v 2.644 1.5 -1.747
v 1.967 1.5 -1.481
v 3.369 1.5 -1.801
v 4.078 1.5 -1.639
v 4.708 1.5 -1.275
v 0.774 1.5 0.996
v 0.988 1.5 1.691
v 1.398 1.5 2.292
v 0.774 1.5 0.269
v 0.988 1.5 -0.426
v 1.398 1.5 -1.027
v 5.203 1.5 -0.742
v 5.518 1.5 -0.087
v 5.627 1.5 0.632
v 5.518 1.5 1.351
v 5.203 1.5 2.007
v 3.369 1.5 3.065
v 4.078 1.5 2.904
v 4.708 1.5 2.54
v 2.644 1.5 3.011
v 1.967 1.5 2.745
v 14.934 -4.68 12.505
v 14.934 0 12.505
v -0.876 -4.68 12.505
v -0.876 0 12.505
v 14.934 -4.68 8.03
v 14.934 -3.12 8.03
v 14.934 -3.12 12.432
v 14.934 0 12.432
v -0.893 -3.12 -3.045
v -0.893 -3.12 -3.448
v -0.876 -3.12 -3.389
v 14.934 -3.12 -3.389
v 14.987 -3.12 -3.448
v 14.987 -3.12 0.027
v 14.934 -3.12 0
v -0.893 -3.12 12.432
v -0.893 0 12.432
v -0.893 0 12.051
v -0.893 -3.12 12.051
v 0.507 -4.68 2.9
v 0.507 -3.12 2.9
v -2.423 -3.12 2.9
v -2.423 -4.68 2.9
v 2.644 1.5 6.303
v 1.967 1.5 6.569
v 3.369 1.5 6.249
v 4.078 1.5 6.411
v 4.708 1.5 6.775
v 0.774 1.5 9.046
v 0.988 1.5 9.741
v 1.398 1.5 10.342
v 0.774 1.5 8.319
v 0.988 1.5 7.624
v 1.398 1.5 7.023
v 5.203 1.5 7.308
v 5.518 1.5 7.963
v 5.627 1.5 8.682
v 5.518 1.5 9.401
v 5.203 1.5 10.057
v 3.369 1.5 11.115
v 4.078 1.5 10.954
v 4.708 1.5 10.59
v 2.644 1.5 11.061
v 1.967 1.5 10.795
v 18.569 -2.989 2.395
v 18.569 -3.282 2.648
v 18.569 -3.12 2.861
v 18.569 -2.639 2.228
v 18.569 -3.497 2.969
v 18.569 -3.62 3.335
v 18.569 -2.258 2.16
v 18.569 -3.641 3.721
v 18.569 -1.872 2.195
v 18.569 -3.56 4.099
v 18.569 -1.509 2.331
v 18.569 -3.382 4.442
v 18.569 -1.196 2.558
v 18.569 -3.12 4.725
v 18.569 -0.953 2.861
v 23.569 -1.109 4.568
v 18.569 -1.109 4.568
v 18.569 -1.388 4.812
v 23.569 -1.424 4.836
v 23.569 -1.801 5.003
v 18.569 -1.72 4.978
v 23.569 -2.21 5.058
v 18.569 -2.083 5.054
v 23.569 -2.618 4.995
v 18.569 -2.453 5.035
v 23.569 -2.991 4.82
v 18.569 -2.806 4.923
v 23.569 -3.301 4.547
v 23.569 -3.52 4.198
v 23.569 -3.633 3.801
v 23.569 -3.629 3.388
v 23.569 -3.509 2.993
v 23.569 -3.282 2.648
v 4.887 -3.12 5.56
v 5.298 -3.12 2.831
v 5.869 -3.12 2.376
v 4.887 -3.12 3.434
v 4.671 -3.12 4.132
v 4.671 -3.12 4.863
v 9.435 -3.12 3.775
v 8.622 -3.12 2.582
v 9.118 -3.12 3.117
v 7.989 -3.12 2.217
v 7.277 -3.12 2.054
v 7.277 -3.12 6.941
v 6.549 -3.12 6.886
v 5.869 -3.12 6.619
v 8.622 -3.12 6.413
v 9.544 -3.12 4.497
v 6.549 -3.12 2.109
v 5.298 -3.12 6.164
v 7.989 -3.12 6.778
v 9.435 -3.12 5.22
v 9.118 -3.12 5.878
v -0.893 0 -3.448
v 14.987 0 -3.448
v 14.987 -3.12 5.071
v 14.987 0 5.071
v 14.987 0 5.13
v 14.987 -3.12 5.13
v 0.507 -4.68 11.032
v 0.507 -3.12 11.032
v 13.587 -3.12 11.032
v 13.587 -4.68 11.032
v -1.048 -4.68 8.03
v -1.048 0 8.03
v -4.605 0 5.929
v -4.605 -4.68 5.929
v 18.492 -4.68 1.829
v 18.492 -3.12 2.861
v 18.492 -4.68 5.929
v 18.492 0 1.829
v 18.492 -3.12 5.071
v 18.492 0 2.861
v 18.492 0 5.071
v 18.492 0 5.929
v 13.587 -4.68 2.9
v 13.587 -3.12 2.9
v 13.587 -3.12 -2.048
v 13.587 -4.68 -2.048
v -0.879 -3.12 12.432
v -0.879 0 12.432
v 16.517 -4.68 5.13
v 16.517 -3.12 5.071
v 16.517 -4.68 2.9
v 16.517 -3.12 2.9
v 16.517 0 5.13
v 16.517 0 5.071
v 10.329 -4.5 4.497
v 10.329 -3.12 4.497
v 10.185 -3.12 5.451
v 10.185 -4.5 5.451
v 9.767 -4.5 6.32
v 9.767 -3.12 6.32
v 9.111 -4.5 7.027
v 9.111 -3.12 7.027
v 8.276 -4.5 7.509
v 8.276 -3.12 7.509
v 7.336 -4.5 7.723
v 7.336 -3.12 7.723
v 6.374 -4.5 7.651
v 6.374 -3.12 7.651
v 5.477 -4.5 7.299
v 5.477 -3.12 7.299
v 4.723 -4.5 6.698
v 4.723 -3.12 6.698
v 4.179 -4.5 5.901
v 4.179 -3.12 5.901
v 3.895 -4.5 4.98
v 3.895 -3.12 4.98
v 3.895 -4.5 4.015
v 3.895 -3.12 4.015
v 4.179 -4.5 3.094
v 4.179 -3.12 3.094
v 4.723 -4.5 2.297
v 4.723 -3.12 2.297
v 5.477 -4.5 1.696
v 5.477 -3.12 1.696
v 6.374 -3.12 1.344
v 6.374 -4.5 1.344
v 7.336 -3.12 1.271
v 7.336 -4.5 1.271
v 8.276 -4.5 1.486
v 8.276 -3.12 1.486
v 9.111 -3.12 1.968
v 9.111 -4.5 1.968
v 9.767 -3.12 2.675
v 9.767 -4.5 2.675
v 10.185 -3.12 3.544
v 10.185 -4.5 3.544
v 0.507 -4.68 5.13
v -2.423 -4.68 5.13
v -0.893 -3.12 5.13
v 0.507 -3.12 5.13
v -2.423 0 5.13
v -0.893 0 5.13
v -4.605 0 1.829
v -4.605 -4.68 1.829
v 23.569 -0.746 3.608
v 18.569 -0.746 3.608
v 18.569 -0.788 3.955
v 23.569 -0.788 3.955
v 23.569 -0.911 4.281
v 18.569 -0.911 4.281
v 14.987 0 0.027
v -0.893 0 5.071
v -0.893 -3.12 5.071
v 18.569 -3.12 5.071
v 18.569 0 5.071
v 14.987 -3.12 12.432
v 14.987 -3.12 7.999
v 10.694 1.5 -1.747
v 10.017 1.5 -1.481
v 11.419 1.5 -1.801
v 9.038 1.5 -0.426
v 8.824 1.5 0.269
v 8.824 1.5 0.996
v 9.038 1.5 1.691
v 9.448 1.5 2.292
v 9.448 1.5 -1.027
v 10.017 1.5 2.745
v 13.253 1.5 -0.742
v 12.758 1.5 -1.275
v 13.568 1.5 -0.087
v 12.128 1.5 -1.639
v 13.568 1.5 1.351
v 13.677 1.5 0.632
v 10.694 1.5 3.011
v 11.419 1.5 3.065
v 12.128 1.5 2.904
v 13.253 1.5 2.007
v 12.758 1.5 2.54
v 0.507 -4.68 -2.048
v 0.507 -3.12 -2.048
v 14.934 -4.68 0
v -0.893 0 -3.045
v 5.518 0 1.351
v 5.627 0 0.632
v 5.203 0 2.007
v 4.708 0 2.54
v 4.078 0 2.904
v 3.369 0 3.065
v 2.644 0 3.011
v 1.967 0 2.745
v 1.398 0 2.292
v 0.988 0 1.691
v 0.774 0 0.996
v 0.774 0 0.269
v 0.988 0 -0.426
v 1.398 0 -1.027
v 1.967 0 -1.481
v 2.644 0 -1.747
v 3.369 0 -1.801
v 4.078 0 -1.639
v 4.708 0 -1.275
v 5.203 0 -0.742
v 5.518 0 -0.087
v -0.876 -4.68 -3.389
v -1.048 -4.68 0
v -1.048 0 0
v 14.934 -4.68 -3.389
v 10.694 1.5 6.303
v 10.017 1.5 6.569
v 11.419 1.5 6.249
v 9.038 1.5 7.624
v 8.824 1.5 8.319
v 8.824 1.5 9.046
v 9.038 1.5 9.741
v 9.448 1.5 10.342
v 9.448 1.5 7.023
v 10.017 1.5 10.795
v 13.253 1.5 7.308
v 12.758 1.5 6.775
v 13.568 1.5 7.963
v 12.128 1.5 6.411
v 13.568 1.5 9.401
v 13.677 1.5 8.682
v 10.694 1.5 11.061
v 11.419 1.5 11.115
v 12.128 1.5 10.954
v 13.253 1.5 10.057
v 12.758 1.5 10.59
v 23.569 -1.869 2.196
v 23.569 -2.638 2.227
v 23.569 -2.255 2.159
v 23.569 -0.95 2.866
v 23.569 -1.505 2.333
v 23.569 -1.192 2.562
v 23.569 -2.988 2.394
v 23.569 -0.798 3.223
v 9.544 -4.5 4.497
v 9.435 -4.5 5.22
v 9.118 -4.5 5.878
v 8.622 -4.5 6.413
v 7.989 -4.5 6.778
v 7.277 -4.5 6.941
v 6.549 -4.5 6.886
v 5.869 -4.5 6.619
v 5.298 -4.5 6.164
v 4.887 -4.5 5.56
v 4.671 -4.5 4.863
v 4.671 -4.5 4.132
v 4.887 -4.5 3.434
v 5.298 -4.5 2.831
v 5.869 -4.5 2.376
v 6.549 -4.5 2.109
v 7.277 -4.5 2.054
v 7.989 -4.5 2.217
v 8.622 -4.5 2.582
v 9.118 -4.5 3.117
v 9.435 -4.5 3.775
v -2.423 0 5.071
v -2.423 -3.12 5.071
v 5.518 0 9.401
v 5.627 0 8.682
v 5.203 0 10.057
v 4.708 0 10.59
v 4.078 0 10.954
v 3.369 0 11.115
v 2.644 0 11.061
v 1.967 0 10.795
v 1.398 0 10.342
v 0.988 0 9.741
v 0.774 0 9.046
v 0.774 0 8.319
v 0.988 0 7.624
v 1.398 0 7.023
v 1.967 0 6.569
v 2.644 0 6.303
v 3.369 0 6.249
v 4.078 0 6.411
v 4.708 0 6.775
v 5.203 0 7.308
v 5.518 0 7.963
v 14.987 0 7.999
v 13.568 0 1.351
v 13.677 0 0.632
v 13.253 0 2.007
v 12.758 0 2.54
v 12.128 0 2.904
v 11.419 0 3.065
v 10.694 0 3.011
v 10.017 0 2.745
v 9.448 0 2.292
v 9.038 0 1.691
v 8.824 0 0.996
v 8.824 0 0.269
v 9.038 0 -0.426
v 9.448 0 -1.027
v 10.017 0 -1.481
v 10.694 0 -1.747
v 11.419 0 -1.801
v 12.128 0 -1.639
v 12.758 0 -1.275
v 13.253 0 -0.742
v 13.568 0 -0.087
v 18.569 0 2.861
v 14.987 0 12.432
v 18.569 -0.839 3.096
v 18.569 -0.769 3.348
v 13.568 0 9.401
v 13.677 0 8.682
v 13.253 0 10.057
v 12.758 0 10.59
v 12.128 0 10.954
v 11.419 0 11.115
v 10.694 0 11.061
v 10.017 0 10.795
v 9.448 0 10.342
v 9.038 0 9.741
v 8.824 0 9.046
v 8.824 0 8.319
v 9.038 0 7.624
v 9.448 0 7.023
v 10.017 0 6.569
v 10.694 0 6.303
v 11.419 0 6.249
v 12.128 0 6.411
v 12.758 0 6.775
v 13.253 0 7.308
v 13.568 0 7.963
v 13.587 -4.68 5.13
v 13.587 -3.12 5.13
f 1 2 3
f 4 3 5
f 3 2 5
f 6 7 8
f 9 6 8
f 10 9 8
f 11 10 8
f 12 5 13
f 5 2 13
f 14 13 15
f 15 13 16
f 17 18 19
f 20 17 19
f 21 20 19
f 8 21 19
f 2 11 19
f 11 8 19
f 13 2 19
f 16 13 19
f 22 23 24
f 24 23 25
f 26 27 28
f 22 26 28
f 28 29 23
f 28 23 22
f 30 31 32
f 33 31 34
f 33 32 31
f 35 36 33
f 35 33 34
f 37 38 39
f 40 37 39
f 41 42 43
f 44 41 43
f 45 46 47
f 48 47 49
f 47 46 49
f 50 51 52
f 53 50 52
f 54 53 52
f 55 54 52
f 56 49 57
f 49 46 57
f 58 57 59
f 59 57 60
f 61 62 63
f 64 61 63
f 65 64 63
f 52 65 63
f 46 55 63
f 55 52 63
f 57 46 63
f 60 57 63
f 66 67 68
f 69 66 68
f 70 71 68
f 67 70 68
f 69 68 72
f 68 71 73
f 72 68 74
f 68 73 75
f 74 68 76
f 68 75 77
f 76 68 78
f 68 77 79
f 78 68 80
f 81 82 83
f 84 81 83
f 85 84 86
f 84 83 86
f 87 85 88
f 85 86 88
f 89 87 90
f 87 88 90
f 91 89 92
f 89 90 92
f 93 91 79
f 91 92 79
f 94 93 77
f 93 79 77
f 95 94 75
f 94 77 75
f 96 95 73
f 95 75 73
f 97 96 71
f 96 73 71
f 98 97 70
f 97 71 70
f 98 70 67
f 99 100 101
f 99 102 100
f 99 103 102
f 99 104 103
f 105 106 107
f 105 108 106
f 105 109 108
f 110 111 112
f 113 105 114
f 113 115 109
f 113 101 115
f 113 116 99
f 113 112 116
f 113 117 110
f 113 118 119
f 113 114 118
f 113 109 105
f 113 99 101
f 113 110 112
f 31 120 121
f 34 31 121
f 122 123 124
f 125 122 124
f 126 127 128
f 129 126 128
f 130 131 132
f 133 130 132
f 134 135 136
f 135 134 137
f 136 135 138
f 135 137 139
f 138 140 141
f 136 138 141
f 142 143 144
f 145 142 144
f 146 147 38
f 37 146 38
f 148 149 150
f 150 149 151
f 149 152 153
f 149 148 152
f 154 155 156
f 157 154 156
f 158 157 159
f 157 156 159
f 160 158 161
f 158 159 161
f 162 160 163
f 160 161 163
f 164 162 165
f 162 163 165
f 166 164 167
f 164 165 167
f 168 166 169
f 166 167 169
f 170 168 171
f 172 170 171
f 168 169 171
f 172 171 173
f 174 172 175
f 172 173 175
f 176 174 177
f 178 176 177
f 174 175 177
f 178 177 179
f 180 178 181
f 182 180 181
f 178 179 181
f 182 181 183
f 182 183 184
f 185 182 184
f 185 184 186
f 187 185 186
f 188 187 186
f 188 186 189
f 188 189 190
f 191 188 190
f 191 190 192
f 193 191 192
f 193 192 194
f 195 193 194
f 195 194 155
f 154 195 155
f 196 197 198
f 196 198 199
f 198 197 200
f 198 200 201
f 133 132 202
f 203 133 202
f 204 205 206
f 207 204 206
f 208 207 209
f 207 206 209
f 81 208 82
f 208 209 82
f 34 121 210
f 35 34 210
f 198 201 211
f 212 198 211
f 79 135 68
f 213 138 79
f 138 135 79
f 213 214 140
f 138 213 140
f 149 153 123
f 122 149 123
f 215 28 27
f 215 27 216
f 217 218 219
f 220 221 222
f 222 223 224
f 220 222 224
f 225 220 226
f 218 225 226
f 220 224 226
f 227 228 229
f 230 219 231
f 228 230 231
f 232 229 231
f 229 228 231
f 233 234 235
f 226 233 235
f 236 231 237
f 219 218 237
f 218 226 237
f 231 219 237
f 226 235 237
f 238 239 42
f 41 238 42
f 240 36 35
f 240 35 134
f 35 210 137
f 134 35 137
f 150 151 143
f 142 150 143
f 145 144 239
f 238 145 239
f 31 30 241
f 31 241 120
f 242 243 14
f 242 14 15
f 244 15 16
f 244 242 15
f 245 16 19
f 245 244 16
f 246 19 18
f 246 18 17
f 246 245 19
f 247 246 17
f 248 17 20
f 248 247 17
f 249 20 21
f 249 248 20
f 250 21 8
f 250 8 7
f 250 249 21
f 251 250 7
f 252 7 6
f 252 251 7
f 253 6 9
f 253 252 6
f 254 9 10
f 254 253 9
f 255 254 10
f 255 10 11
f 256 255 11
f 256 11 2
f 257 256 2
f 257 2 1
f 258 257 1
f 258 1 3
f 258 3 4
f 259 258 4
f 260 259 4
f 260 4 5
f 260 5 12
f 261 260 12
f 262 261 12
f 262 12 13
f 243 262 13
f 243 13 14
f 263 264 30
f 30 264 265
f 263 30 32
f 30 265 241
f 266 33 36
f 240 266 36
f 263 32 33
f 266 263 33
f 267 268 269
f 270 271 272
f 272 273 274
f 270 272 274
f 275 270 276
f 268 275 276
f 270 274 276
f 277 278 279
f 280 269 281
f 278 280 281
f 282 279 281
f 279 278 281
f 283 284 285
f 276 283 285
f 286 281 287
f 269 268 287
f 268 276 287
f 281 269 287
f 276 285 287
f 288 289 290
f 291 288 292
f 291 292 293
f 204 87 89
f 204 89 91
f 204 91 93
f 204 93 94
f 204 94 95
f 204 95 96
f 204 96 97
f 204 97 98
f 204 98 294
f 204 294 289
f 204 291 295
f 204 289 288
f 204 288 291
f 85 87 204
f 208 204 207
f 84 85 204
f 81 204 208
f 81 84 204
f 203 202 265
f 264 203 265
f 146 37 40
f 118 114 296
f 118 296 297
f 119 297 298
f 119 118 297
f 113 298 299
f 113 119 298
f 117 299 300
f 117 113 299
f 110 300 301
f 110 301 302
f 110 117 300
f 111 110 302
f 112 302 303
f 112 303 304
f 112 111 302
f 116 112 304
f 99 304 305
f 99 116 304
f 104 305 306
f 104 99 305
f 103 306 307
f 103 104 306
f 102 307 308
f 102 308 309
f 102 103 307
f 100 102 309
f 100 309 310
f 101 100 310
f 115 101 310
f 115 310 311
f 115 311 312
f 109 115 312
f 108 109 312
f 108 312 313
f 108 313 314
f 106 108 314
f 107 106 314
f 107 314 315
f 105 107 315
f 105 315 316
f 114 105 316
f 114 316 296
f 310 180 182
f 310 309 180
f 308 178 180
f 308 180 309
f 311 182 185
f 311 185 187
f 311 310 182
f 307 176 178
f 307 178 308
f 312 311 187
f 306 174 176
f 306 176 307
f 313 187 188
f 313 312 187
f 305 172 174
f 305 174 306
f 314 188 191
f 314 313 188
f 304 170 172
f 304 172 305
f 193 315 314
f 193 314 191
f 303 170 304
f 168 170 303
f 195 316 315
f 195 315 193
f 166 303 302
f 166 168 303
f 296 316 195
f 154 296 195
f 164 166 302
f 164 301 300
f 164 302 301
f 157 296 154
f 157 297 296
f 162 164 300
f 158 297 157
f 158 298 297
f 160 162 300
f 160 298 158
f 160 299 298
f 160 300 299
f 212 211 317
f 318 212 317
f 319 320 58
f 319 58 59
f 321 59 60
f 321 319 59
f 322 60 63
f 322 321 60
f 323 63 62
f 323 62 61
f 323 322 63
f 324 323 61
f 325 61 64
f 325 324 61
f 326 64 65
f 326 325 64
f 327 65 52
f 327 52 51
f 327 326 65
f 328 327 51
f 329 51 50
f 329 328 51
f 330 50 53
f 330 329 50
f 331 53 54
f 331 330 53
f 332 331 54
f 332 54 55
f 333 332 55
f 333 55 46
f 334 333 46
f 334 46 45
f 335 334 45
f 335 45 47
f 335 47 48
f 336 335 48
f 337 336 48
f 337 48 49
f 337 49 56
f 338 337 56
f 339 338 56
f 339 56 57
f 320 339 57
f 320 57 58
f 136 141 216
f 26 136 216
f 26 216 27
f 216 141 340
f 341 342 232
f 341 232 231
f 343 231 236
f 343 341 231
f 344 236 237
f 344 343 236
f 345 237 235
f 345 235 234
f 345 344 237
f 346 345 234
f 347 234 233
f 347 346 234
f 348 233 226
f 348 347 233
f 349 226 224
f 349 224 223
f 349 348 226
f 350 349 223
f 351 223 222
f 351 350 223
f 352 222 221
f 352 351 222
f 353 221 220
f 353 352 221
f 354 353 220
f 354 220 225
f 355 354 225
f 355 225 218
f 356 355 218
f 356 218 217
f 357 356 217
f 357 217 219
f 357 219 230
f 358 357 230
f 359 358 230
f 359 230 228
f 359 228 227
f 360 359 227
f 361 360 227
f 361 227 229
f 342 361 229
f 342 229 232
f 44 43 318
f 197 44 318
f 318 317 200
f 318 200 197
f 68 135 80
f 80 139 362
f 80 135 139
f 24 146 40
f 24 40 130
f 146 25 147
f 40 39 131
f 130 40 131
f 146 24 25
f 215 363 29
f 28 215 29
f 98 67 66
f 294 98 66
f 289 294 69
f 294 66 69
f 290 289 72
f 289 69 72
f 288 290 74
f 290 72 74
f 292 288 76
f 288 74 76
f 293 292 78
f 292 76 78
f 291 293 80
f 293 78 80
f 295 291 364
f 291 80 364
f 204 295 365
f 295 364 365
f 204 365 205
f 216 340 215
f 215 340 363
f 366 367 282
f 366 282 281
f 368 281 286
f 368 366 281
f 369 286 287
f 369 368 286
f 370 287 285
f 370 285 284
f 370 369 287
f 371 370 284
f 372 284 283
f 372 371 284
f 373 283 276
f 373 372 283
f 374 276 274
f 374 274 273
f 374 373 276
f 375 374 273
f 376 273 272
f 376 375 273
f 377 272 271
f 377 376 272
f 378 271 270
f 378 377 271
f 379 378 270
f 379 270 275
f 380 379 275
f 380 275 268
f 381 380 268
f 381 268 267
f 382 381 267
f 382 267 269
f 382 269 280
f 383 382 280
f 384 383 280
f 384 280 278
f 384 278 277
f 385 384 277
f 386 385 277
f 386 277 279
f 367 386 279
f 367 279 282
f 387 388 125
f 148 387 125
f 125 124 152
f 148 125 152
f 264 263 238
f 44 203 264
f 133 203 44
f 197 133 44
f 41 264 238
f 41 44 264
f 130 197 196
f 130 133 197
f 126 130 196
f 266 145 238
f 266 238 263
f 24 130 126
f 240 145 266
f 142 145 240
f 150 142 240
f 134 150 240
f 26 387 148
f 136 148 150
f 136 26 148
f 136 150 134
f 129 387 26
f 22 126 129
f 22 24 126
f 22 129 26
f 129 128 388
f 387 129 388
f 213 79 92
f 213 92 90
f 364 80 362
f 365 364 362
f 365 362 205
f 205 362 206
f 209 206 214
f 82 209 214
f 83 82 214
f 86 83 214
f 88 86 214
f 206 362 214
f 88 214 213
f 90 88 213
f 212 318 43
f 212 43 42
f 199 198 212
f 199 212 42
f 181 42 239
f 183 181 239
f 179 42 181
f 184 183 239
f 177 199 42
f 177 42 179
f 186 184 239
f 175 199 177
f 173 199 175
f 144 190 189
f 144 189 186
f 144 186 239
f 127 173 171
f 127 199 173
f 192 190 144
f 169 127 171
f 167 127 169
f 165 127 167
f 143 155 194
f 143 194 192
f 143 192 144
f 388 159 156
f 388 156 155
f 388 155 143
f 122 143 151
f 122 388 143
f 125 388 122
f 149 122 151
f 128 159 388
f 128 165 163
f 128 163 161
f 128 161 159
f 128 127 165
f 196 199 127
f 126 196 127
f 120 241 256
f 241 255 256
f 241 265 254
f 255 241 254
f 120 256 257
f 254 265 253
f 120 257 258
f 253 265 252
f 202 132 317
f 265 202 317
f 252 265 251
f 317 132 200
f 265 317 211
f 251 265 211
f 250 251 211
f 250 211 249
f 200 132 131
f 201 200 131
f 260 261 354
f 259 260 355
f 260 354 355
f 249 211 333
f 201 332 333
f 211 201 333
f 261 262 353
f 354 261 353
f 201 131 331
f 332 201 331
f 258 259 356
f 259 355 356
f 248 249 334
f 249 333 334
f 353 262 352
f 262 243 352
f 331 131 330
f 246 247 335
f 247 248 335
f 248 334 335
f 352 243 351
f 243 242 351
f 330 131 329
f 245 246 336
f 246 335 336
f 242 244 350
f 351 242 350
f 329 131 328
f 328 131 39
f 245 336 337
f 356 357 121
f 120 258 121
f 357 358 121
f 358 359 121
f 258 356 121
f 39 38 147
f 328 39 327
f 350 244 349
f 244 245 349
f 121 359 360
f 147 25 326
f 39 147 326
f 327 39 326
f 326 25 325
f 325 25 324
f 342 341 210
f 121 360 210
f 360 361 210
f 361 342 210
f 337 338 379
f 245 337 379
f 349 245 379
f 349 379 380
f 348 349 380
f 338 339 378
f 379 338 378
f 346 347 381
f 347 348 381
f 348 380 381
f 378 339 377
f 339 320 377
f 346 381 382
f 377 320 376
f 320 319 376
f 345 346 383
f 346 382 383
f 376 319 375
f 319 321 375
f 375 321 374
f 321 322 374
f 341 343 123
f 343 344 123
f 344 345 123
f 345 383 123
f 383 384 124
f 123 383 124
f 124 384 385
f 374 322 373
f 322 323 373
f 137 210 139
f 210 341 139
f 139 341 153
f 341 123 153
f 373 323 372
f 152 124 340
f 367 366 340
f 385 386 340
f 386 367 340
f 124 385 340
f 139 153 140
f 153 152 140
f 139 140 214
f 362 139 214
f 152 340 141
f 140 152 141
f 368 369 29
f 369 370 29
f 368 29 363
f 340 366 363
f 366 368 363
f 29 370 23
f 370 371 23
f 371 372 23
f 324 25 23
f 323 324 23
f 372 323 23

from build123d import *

# Parameters (mm, degrees)
F1_DEPTH = 3.12
F2_R     = 2.44
F3_DEPTH = 1.5
F5_DEPTH = 4.68
F6_R     = 3.235
F6_R_2   = 2.45
F7_DEPTH = 4.5
F9_DEPTH = 5


# Not quite as in the source:
# - the program builds the solid bodies; features that only make, move or delete a surface that nothing else refers to are left out


with BuildPart() as f1:
    # F0 (on Front) → F1 (new body)
    with BuildSketch(Plane.XZ):
        Polygon((14.9867535406, 12.4322535499), (-0.8932464594, 12.4322535499), (-0.8932464594, 5.6322535499), (-0.8932464594, 5.0706164911), (-3.7561513018, 5.0706164911), (-3.7561513018, 2.860605251), (-0.8932464594, 2.860605251), (-0.8932464594, -3.4477464501), (14.9867535406, -3.4477464501), (14.9867535406, 2.860605251), (18.5687988997, 2.860605251), (18.5687988997, 5.0706164911), (14.9867535406, 5.0706164911), (14.9867535406, 5.5522535499), align=None)
    extrude(amount=F1_DEPTH)

    # F2 (on Front) → F3 (join)
    with BuildSketch(Plane.XZ):
        with Locations((11.2367535406, 8.6822535499)):
            Circle(F2_R)
        with Locations((3.1867535406, 8.6822535499)):
            Circle(F2_R)
        with Locations((3.1867535406, 0.6322535499)):
            Circle(F2_R)
        with Locations((11.2367535406, 0.6322535499)):
            Circle(F2_R)
    extrude(amount=-F3_DEPTH)

    # F4 (on Front) → F5 (join)
    with BuildSketch(Plane.XZ):
        Polygon((0.5067535406, 5.13), (0.5067535406, 11.0322535499), (13.5867535406, 11.0322535499), (13.5867535406, 5.13), (14.9343172088, 5.13), (14.9343172088, 8.03), (14.9343172088, 12.5052658841), (-0.8757988689, 12.5052658841), (-1.0476475582, 8.03), (-4.6052209849, 5.9285708389), (-4.6052209849, 1.8285708389), (-1.0476475582, 0), (-0.8757988689, -3.3894693479), (14.9343172088, -3.3894693479), (14.9343172088, 0), (14.9343172088, 2.9), (13.5867535406, 2.9), (13.5867535406, -2.0477464501), (0.5067535406, -2.0477464501), (0.5067535406, 2.9), (-2.4232464594, 2.9), (-2.4232464594, 5.13), align=None)
        Polygon((14.9343172088, 8.03), (14.9343172088, 5.13), (16.5167535406, 5.13), (16.5167535406, 2.9), (14.9343172088, 2.9), (14.9343172088, 0), (18.4918906356, 1.8285708389), (18.4918906356, 5.9285708389), align=None)
    extrude(amount=F5_DEPTH)

    # F6 (on Front) → F7 (join)
    with BuildSketch(Plane.XZ):
        with Locations((7.094095153, 4.4974250309)):
            Circle(F6_R)
        with Locations((7.094095153, 4.4974250309)):
            Circle(F6_R_2, mode=Mode.SUBTRACT)
    extrude(amount=F7_DEPTH)

    # F8 (on face) → F9 (join)
    with BuildSketch(Plane.YZ.offset(18.5687988997)):
        with BuildLine():
            ThreePointArc((-0.7456844895, 3.608182552), (-0.8395787407, 4.1214828522), (-1.1091013145, 4.5683059836))
            Line((-1.1091013145, 4.5683059836), (-3.2822676645, 2.6480591205))
            ThreePointArc((-3.2822676645, 2.6480591205), (-1.6823841893, 2.2520768032), (-0.7456844895, 3.608182552))
        make_face()
        with BuildLine():
            Line((-3.2822676645, 2.6480591205), (-1.1091013145, 4.5683059836))
            ThreePointArc((-1.1091013145, 4.5683059836), (-3.1558079211, 4.694765727), (-3.2822676645, 2.6480591205))
        make_face()
    extrude(amount=F9_DEPTH)


solid = f1.part
